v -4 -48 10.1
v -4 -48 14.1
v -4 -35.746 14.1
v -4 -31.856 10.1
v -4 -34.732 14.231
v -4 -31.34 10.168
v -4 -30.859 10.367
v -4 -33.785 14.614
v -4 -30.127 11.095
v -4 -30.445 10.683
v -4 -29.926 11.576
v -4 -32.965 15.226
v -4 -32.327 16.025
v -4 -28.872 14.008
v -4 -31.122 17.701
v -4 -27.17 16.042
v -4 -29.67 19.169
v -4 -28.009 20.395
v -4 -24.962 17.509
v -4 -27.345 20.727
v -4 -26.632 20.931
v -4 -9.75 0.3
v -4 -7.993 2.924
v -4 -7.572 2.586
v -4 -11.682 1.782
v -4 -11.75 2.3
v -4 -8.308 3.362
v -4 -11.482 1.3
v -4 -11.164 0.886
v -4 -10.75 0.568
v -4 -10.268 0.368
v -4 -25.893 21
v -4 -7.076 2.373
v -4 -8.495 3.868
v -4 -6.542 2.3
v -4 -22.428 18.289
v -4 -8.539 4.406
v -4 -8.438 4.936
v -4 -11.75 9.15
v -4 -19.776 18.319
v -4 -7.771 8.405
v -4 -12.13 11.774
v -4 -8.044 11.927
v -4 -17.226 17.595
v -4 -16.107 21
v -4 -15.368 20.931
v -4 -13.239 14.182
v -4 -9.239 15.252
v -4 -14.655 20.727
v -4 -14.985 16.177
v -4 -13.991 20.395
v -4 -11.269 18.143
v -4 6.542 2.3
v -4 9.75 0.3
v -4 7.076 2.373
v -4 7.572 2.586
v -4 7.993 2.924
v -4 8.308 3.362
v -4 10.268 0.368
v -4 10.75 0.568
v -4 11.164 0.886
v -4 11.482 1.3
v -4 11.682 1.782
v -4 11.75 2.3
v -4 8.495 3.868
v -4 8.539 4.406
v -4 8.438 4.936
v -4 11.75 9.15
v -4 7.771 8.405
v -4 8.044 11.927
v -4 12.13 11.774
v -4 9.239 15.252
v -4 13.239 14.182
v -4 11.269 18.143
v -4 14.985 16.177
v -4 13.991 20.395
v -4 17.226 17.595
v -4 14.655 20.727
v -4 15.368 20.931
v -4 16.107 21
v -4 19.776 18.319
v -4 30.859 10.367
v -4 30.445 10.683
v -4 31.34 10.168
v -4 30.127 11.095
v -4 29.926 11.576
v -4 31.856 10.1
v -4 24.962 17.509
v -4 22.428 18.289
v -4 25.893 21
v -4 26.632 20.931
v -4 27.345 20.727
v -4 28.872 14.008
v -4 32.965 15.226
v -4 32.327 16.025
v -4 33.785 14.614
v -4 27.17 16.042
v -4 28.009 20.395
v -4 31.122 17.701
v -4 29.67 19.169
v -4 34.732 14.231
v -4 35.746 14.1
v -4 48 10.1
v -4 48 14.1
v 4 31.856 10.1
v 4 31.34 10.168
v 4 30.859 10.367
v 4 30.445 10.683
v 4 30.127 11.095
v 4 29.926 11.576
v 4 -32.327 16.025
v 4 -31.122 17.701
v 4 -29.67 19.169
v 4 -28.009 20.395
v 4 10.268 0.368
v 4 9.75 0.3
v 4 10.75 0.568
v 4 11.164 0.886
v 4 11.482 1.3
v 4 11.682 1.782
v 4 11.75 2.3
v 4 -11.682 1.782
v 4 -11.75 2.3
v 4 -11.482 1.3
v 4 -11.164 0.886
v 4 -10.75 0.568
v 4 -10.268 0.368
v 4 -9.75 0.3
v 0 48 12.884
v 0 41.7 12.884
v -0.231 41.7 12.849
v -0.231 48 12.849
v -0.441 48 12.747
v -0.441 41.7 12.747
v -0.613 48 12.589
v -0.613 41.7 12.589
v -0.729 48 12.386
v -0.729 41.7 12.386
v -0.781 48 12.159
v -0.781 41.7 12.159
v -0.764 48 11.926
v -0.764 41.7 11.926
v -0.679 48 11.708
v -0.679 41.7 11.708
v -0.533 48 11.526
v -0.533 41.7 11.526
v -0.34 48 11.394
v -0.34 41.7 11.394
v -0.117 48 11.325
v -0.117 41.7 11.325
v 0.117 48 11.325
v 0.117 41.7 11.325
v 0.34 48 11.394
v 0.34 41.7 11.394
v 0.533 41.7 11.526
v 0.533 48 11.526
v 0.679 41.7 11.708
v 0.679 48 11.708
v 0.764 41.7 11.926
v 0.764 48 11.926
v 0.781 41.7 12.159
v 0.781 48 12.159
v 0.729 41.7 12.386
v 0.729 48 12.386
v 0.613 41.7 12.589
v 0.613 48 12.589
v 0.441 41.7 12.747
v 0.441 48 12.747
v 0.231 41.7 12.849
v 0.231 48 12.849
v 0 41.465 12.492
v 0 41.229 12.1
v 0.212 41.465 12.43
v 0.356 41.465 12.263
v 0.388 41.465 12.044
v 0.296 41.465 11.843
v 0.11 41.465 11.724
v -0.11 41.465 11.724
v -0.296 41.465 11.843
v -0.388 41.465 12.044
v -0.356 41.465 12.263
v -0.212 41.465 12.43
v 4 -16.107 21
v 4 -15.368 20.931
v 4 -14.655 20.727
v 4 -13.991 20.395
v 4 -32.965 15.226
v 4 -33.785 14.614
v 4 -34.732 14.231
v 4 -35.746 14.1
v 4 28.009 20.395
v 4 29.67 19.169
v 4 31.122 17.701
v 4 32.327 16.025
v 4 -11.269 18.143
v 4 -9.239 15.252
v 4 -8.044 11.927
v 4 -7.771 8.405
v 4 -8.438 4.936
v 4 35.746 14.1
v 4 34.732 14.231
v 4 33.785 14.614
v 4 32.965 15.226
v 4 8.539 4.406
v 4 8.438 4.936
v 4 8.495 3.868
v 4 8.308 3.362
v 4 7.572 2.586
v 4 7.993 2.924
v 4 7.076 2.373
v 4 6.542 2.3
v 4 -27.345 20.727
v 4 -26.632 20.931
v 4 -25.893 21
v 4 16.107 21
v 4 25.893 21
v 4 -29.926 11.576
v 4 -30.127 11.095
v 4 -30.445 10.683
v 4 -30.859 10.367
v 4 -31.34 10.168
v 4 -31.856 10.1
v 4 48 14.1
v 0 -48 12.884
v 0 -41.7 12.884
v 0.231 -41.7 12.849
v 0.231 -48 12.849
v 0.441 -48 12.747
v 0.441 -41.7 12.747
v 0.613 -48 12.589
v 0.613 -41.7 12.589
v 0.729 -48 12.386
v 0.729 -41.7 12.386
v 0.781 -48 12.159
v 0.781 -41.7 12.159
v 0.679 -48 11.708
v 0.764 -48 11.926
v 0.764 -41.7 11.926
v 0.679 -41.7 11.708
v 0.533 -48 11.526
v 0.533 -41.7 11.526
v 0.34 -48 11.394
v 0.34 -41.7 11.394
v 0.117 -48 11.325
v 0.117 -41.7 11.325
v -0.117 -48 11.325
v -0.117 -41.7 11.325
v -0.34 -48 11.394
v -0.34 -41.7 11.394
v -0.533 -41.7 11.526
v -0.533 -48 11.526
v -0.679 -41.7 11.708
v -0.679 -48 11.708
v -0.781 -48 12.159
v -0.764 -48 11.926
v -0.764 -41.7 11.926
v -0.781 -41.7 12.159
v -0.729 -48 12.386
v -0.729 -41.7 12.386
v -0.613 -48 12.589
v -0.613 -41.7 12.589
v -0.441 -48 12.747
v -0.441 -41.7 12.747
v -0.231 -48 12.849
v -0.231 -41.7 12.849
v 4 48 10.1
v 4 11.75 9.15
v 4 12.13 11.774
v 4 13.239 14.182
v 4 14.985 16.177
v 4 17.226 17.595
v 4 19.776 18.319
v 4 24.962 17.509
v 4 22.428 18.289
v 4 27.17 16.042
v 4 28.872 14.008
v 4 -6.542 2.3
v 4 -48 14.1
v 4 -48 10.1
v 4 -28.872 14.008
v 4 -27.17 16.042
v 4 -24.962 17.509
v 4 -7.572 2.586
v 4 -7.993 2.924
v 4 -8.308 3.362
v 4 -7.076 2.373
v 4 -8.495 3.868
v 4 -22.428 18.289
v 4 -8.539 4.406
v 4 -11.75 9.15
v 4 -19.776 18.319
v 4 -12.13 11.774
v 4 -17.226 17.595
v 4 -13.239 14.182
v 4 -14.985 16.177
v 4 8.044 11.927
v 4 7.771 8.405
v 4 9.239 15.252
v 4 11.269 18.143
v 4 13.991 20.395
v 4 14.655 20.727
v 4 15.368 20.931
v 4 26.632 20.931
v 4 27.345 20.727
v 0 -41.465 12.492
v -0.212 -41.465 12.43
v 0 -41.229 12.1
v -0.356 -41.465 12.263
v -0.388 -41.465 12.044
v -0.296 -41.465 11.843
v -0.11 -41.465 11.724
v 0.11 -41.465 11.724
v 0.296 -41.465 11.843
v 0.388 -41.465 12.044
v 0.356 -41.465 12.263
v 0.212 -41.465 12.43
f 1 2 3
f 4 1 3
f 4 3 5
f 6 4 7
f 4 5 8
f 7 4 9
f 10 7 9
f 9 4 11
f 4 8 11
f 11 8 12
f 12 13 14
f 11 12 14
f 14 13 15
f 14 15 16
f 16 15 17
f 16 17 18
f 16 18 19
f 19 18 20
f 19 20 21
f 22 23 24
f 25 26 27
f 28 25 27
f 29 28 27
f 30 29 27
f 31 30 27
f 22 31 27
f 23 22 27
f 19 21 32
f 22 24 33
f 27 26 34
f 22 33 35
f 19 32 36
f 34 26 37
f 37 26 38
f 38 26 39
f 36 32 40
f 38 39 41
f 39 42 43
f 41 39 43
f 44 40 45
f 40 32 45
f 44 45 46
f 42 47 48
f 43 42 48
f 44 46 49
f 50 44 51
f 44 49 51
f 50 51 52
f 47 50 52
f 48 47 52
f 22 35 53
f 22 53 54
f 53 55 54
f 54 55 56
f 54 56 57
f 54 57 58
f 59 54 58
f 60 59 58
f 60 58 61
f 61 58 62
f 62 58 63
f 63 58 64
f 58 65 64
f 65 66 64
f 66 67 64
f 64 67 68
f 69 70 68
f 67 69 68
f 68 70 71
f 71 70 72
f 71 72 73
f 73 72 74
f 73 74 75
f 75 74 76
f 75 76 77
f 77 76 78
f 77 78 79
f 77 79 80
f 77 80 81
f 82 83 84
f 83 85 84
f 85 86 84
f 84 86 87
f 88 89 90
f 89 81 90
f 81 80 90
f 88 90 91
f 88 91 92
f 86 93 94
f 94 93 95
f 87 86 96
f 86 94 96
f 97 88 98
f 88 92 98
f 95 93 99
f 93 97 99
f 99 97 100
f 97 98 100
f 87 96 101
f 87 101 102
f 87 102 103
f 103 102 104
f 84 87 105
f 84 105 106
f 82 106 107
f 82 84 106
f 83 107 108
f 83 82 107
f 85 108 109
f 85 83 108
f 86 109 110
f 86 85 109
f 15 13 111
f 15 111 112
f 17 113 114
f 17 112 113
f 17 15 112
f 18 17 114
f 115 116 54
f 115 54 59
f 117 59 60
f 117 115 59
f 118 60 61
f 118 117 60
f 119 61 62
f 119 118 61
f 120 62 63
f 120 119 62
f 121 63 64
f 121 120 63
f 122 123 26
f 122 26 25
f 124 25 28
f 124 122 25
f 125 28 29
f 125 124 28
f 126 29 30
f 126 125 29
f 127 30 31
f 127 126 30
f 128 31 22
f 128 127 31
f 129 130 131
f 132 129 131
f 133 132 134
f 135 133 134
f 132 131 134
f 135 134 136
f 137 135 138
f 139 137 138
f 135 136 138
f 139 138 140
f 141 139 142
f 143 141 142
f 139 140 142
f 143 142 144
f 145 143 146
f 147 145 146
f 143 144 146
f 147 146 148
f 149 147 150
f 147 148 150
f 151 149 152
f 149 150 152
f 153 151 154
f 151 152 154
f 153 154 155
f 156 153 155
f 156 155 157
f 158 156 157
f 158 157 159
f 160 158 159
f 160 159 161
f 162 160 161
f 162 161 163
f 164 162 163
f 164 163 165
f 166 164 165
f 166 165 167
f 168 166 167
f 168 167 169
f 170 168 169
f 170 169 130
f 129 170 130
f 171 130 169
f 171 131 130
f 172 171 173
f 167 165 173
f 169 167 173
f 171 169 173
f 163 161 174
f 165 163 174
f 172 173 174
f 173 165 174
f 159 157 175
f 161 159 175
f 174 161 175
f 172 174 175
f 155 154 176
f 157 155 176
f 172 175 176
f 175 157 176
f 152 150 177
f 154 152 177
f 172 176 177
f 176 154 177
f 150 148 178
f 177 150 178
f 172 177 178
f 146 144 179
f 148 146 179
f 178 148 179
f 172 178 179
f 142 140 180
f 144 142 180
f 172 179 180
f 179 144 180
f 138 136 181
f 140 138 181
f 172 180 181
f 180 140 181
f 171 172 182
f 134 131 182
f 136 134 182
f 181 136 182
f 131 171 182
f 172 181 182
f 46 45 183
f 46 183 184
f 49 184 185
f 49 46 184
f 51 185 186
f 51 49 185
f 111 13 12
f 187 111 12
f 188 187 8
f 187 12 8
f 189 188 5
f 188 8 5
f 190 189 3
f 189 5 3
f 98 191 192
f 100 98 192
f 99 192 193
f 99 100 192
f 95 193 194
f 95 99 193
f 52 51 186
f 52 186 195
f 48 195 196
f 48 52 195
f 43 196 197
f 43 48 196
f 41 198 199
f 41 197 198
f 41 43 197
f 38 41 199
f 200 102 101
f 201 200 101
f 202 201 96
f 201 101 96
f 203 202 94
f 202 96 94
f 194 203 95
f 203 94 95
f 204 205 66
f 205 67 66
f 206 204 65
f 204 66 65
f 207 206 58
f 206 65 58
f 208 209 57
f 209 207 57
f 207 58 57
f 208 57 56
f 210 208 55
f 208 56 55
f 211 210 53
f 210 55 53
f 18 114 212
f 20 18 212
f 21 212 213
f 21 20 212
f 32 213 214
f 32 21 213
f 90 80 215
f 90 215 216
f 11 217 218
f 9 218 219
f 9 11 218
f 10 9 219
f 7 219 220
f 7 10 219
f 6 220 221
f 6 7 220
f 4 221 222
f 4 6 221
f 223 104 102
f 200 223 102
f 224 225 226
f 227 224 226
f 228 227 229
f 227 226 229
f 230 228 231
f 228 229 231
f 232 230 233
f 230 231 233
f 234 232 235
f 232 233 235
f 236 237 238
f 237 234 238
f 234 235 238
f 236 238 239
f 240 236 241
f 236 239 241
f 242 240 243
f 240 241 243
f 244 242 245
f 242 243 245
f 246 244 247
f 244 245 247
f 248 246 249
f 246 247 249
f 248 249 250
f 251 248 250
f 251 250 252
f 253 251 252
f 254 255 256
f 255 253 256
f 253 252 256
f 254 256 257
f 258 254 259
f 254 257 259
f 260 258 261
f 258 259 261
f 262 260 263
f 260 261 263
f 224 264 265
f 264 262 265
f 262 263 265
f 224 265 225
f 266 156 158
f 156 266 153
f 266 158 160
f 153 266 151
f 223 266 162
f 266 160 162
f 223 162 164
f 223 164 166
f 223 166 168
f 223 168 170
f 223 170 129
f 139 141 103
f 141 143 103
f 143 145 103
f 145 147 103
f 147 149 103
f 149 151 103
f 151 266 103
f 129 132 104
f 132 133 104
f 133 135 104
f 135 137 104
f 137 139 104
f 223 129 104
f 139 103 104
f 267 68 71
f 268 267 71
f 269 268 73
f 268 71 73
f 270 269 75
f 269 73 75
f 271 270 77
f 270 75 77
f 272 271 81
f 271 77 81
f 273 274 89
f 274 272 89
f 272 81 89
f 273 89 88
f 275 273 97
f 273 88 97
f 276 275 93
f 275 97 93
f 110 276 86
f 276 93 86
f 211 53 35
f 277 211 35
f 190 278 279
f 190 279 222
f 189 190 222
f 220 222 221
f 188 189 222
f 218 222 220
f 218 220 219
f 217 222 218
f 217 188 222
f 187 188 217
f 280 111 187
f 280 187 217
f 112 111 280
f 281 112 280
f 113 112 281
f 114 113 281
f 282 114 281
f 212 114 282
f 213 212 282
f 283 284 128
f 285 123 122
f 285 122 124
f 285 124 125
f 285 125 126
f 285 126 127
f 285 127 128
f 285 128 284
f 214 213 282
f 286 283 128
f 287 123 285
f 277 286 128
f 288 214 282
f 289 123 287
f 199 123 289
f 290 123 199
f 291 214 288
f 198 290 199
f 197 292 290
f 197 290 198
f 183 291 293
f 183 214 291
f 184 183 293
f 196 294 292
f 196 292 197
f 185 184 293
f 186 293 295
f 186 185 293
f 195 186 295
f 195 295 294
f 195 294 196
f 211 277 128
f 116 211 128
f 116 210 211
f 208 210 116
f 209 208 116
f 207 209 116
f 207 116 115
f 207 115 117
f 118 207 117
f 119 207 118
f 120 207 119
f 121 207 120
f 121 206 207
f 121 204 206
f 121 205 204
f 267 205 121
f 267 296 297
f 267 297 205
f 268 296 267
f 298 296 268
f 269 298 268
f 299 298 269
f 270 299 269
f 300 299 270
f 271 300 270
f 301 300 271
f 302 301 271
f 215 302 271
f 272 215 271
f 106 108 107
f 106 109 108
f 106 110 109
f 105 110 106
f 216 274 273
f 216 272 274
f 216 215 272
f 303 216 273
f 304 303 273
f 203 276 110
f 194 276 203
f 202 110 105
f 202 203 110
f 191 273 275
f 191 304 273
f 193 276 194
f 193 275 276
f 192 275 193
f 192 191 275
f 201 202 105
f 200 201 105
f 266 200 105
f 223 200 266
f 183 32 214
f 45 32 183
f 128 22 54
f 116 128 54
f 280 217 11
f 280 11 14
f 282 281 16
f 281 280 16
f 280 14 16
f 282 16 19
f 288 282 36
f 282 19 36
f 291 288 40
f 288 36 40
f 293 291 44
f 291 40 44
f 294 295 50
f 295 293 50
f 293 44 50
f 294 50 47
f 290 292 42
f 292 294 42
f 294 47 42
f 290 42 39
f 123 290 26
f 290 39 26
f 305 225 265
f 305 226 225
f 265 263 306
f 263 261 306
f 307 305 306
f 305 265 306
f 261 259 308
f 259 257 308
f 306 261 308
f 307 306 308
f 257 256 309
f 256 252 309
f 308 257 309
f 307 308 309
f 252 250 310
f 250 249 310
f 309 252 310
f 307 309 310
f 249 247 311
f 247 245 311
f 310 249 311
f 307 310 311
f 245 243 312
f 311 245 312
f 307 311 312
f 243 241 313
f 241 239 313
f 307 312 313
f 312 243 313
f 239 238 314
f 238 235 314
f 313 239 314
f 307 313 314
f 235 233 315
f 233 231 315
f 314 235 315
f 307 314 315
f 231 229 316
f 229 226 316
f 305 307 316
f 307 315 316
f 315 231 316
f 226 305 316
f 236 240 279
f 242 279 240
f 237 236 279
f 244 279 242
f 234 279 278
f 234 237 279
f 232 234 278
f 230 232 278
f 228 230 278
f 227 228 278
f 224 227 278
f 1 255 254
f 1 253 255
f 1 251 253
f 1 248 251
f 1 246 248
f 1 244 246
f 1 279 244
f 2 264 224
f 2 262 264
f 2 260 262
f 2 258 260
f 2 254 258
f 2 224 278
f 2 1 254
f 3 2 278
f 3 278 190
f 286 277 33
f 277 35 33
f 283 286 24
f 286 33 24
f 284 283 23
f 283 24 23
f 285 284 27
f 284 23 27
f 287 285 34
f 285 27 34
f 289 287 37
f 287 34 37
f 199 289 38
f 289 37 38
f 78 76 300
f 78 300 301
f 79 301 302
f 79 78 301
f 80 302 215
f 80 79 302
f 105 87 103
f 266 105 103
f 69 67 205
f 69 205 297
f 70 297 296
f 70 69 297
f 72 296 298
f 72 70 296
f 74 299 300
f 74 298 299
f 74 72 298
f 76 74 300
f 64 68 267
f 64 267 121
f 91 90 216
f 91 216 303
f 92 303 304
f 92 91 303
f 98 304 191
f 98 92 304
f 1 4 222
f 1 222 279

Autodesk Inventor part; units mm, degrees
ref_plane "YZ Plane" through (0, 0, 0) normal (1, 0, 0) x (0, 1, 0)
ref_plane "XZ Plane" through (0, 0, 0) normal (0, 1, 0) x (-1, 0, 0)
ref_plane "XY Plane" through (0, 0, 0) normal (0, 0, 1) x (1, 0, 0)
sketch "Sketch1" plane through (0, 0, 0) normal (1, 0, 0) x (0, 1, 0)
  line L0 (-11.75, 0.3) -> (11.75, 0.3)
  arc A0 (30.2011, 10.1) -> (11.75, 9.15) centre (21, 9.15) ccw
  arc A1 (-11.75, 9.15) -> (-30.2011, 10.1) centre (-21, 9.15) ccw
  line L1 (-30.2011, 10.1) -> (-48, 10.1)
  line L2 (-48, 10.1) -> (-48, 14.1)
  line L3 (-48, 14.1) -> (-33.2906, 14.1)
  arc A2 (-8.4379, 4.9361) -> (-33.2906, 14.1) centre (-21, 9.15) ccw
  arc A3 (33.2906, 14.1) -> (8.4379, 4.9361) centre (21, 9.15) ccw
  line L4 (30.2011, 10.1) -> (48, 10.1)
  line L5 (48, 10.1) -> (48, 14.1)
  line L6 (48, 14.1) -> (33.2906, 14.1)
  line L7 (6.5418, 2.3) -> (-6.5418, 2.3)
  line L8 (-26.9279, 21) -> (-15.0721, 21)
  line L9 (15.0721, 21) -> (26.9279, 21)
  line L10 (11.75, 9.15) -> (11.75, 0.3)
  line L11 (-11.75, 9.15) -> (-11.75, 0.3)
  arc A4 (-8.4379, 4.9361) -> (-6.5418, 2.3) centre (-6.5418, 4.3) ccw
  arc A5 (6.5418, 2.3) -> (8.4379, 4.9361) centre (6.5418, 4.3) ccw
  point P0 (0, 0)
  point P1 (0, 0.3)
  point P2 (0, 2.3)
  dimension "d1" = 9.25
  dimension "d3" = 42
  dimension "d4" = 96
  dimension "d5" = 4
  dimension "d8" = 4
  dimension "d11" = 0.3
  dimension "d13" = 10.1
  dimension "d14" = 9.15
  dimension "d15" = 21
  dimension "d26" = 2
  dimension "d30" = 2
  dimension "d31" = 13.0836
extrude "Extrusion1" add sketch "Sketch1" along normal mid plane 8 contours L11 A1 L1 L2 L3 A2 L8 A4 L7 A5 A3 L9 L6 L5 L4 A0 L10 L0
sketch "Sketch2" plane through (-4, 48, 14.1) normal (0, 1, 0) x (1, 0, 0)
  line L0 (0, 0) -> (8, 0) projected
  line L1 (8, 4) -> (8, 0) projected
  line L2 (0, 4) -> (8, 4) projected
  line L3 (0, 0) -> (0, 4) projected
  line L4 (0, 4) -> (8, 4) projected
  line L5 (0, 0) -> (0, 4) projected
  point P0 (4, 14.1)
  point P1 (4, 2)
  point P2 (4, 4)
  point P3 (0, 2)
hole "Hole1" at (0, 48, 12.1) direction (0, -1, 0) diameter 1.567 depth 6.3 tip angle 118 thread size "M2x0.4" class "6H" standard "ANSI Metric M Profile"
mirror "Mirror1" about plane through (0, 0, 0) normal (0, 1, 0) of "Hole1"
fillet "Fillet3" radius 4 6 edges at (0, -26.9279, 21) (0, -15.0721, 21) (0, 15.0721, 21) (0, 26.9279, 21) (0, 33.2906, 14.1) (0, -33.2906, 14.1)
fillet "Fillet3" radius 2 4 edges at (0, -30.2011, 10.1) (0, 30.2011, 10.1) (0, -11.75, 0.3) (0, 11.75, 0.3)
properties part number "EPS_RegulatorHeatsinkBatteryAdapter" material "Copper"
